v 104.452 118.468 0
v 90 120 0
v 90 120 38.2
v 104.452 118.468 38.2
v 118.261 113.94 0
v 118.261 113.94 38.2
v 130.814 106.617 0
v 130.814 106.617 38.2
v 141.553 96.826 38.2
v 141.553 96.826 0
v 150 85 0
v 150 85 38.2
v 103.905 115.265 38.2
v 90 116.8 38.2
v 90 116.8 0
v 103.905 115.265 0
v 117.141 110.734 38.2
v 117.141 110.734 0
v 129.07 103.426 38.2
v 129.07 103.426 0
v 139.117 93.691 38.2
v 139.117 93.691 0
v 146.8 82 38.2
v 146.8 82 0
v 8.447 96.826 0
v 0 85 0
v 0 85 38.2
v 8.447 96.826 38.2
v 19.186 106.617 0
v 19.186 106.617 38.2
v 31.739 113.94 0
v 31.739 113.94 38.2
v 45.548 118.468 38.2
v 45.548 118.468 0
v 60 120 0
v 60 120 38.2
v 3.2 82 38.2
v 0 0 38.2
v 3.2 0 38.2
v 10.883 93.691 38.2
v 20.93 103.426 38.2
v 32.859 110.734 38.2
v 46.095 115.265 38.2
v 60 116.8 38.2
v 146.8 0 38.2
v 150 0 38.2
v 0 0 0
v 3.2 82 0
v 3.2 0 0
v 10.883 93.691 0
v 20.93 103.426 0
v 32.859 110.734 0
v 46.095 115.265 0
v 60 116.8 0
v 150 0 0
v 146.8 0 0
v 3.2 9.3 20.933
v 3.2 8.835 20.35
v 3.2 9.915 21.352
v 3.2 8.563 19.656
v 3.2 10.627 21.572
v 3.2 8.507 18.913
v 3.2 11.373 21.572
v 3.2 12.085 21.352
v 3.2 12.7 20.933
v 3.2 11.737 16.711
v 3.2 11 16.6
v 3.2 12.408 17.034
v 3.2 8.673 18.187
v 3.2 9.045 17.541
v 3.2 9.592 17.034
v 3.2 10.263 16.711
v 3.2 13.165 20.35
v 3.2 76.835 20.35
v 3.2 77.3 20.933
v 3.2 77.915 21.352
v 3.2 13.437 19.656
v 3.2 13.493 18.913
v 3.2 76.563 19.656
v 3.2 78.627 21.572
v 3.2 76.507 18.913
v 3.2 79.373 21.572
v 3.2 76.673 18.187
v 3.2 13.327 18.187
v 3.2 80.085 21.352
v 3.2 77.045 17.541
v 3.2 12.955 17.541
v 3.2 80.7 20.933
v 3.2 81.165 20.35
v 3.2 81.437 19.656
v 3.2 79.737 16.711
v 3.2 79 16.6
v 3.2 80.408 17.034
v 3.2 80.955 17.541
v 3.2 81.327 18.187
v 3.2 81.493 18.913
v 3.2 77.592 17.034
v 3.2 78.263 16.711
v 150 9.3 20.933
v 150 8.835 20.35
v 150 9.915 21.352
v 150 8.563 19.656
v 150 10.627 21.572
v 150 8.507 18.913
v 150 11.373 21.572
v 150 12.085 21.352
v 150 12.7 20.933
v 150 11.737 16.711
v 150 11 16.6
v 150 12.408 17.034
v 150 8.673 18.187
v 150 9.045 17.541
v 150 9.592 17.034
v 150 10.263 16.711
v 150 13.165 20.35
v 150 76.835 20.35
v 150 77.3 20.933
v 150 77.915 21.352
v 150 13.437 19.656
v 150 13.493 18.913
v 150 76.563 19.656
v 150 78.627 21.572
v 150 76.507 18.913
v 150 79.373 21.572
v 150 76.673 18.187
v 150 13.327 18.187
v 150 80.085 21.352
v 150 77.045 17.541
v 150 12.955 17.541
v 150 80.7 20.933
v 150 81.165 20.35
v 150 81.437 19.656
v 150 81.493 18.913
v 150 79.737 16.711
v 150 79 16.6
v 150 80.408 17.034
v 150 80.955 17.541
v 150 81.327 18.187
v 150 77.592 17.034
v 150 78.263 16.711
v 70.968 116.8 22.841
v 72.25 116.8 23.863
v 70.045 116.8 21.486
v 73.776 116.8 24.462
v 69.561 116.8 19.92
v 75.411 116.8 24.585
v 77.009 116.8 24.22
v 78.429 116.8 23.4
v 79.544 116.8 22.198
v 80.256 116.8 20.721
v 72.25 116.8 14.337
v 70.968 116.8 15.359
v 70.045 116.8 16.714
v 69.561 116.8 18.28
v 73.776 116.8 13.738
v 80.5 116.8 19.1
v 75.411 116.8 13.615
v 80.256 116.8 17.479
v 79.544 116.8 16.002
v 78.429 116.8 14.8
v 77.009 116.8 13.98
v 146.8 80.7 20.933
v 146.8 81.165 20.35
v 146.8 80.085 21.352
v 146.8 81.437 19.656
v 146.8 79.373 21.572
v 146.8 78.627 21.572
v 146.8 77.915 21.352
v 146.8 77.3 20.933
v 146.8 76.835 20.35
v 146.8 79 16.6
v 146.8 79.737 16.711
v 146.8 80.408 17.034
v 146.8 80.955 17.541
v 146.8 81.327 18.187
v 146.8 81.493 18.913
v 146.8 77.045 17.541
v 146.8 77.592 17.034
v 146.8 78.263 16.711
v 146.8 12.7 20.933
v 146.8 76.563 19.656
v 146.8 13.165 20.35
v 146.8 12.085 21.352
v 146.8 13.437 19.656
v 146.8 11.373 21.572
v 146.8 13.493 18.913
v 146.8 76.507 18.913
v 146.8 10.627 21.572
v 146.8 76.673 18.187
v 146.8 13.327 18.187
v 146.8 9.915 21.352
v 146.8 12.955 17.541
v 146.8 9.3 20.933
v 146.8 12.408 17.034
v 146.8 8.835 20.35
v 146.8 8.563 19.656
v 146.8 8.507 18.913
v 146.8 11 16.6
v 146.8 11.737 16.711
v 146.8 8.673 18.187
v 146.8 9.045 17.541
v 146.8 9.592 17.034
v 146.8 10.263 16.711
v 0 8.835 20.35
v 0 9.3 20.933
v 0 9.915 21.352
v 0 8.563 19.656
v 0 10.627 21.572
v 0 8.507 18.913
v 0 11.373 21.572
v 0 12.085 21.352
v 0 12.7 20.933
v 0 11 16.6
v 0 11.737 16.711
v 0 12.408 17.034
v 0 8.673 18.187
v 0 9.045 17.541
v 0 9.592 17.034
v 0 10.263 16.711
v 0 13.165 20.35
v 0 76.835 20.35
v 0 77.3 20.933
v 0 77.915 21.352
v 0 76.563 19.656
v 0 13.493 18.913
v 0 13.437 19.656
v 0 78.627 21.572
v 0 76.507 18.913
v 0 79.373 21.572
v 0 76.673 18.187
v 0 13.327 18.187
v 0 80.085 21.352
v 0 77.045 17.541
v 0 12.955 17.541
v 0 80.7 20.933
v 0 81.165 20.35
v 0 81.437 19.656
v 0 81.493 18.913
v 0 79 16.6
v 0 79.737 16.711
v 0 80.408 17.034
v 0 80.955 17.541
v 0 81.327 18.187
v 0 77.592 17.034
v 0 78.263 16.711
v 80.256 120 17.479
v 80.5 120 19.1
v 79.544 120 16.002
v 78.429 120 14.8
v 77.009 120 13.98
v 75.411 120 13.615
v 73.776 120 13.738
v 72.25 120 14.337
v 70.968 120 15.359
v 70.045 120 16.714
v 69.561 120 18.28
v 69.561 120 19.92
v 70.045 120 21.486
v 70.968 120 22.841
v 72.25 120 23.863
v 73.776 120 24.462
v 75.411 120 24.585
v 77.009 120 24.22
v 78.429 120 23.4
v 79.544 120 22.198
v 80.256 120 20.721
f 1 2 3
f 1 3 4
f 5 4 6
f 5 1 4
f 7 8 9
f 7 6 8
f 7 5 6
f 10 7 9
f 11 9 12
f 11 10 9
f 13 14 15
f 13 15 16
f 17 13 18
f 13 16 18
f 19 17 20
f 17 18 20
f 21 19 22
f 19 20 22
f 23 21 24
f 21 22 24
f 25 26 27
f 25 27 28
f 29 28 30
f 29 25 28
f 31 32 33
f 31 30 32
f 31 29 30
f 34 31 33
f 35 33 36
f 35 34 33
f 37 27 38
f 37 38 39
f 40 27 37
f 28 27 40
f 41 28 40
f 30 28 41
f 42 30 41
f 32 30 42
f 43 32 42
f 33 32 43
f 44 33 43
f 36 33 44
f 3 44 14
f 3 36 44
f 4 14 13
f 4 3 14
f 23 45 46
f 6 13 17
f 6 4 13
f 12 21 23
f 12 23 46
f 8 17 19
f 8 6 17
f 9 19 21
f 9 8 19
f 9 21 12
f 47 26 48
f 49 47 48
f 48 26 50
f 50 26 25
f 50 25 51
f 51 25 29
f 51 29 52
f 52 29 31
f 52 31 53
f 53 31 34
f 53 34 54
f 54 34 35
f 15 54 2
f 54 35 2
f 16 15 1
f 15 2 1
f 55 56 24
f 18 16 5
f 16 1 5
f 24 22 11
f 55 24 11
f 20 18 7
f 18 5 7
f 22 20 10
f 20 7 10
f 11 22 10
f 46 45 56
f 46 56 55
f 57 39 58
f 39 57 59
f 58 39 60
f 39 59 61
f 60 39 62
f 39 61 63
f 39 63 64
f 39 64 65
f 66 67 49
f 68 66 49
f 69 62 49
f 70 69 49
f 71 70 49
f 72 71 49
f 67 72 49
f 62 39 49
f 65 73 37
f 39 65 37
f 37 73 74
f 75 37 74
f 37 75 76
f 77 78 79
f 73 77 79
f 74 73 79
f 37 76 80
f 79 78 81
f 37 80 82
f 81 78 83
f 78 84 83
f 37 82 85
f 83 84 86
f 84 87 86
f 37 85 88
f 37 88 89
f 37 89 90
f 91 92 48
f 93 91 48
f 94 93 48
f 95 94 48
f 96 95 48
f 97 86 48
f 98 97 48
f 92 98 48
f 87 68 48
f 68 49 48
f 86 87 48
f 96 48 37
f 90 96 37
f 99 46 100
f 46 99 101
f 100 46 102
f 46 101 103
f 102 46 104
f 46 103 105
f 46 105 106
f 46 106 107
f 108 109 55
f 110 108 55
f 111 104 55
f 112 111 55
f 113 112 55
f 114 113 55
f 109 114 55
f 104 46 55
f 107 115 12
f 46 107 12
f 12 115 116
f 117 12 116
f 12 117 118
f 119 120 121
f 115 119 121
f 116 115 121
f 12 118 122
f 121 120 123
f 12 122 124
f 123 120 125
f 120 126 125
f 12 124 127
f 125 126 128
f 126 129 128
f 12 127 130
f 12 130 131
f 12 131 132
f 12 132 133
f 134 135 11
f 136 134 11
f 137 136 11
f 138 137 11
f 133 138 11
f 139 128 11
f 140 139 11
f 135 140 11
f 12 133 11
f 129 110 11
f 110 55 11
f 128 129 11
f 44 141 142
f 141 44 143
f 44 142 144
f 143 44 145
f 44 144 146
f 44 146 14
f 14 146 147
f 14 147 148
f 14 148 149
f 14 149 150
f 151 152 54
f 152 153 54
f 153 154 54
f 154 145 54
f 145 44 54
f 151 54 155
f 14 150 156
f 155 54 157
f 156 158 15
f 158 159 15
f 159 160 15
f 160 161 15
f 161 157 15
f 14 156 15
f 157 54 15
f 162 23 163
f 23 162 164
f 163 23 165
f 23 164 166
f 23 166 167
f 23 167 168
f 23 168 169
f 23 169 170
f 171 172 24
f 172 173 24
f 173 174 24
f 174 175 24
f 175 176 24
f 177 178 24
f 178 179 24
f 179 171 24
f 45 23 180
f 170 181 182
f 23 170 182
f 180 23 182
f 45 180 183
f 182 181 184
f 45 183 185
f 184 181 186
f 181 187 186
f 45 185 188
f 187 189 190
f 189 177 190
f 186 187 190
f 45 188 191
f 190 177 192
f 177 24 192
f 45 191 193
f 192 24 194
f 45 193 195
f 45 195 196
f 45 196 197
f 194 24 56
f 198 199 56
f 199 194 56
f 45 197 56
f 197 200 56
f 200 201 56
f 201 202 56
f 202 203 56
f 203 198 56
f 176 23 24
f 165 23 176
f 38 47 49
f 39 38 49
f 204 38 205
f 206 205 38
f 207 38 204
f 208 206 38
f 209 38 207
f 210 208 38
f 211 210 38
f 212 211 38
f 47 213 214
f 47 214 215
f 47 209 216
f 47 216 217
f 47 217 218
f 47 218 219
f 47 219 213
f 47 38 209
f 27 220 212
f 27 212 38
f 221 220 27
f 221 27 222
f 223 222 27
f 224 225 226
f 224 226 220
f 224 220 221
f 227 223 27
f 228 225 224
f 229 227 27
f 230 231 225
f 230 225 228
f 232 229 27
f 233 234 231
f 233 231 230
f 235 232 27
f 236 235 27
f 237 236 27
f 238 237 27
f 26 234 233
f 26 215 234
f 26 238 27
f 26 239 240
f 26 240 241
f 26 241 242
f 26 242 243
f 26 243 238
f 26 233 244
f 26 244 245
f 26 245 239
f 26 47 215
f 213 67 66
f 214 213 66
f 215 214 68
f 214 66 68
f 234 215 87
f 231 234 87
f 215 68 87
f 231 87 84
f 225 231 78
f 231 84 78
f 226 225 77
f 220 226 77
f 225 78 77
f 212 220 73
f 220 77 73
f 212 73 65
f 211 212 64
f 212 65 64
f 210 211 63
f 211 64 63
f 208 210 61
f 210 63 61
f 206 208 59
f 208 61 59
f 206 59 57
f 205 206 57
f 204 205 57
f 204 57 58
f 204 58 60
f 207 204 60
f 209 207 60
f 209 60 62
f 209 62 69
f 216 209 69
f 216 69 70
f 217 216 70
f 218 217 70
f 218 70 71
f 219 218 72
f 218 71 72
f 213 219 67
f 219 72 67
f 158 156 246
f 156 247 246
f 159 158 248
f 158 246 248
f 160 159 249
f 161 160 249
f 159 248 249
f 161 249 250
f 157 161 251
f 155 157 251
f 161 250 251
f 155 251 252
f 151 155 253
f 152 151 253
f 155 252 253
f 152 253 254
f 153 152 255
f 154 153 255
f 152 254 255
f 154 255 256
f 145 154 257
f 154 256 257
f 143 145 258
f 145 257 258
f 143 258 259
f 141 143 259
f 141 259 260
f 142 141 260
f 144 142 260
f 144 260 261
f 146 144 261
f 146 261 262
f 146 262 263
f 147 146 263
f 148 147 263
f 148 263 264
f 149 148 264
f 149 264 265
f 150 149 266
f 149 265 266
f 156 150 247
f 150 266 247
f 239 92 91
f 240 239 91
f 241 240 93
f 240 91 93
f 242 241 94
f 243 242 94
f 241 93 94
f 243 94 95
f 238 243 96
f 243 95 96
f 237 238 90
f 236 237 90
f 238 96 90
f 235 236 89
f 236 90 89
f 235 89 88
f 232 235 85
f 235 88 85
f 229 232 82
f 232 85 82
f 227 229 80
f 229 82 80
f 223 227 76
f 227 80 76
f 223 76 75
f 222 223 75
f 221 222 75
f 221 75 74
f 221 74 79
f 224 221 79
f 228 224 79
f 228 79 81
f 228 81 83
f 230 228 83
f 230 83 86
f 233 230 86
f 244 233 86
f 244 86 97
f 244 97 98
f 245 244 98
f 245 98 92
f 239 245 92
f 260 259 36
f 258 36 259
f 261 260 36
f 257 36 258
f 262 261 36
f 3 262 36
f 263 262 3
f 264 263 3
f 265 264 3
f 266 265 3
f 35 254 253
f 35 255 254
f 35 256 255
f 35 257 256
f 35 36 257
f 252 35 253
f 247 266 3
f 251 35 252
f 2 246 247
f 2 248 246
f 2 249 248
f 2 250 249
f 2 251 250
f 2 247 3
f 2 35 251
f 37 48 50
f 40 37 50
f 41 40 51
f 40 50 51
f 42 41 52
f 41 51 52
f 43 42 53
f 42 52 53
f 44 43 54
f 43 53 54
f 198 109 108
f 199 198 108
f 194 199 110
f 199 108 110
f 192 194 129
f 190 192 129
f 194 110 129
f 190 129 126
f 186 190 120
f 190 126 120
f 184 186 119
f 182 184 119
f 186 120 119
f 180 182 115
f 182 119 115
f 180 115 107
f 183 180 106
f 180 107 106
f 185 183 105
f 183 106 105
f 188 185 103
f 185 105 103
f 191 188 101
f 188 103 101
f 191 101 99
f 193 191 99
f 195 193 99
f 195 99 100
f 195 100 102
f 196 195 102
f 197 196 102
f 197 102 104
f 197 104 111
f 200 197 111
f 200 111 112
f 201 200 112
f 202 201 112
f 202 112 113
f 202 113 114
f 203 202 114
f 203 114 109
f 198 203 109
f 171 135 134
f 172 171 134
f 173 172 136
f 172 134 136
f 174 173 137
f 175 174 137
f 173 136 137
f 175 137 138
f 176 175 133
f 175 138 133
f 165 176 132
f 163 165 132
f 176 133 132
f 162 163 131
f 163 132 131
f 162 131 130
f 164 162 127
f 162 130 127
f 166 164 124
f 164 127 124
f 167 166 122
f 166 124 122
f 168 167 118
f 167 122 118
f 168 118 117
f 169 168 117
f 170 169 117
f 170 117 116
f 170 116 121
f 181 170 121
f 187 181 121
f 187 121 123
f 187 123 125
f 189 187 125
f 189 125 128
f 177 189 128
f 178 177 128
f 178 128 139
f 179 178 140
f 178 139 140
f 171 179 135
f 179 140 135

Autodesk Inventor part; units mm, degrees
ref_plane "YZ Plane" through (0, 0, 0) normal (1, 0, 0) x (0, 1, 0)
ref_plane "XZ Plane" through (0, 0, 0) normal (0, 1, 0) x (-1, 0, 0)
ref_plane "XY Plane" through (0, 0, 0) normal (0, 0, 1) x (1, 0, 0)
sketch "Sketch1" plane through (0, 0, 0) normal (0, 0, 1) x (1, 0, 0)
  line L0 (0, 0) -> (3.2, 0)
  line L1 (3.2, 0) -> (3.2, 82)
  line L2 (0, 0) -> (0, 85)
  line L3 (146.8, 82) -> (146.8, 0)
  line L4 (146.8, 0) -> (150, 0)
  line L5 (150, 0) -> (150, 85)
  arc A0 (60, 116.8) -> (3.2, 82) centre (60, 53.046) ccw
  line L6 (60, 116.8) -> (90, 116.8)
  arc A1 (146.8, 82) -> (90, 116.8) centre (90, 53.046) ccw
  arc A2 (60, 120) -> (0, 85) centre (60, 51.0714) ccw
  line L7 (60, 120) -> (90, 120)
  arc A3 (150, 85) -> (90, 120) centre (90, 51.0714) ccw
  point P0 (75, 120)
  point P1 (75, 116.8)
  dimension "d0" = 3.2
  dimension "d1" = 3.2
  dimension "d2" = 3.2
  dimension "d3" = 150
  dimension "d4" = 120
  dimension "d5" = 30
  dimension "d12" = 85
  dimension "d13" = 75
  dimension "d14" = 3
  dimension "d15" = 30
  dimension "d16" = 85
  dimension "d17" = 8
extrude "Extrusion1" add sketch "Sketch1" along normal blind 38.2
sketch "Sketch2" plane through (150, 0, 0) normal (1, 0, 0) x (0, 0, -1)
  circle A0 centre (-19.1, 11) radius 2.5
  circle A1 centre (-19.1, 79) radius 2.5
  line L0 (0, 0) -> (0, 85) projected
  line L1 (0, 0) -> (-38.2, 0) projected
  dimension "d8" = 19.1
  dimension "d9" = 5
  dimension "d10" = 68
  dimension "d11" = 11
extrude "Extrusion2" cut sketch "Sketch2" against normal through all
sketch "Sketch3" plane through (60, 120, 0) normal (0, 1, 0) x (1, 0, 0)
  circle A0 centre (15, -19.1) radius 5.5
  line L0 (-60, 0) -> (-60, -38.2) projected
  line L1 (30, 0) -> (0, 0) projected
  dimension "d20" = 11
  dimension "d21" = 75
  dimension "d22" = 19.1
extrude "Extrusion3" cut sketch "Sketch3" against normal blind 10
properties part number "shin_bracket"
